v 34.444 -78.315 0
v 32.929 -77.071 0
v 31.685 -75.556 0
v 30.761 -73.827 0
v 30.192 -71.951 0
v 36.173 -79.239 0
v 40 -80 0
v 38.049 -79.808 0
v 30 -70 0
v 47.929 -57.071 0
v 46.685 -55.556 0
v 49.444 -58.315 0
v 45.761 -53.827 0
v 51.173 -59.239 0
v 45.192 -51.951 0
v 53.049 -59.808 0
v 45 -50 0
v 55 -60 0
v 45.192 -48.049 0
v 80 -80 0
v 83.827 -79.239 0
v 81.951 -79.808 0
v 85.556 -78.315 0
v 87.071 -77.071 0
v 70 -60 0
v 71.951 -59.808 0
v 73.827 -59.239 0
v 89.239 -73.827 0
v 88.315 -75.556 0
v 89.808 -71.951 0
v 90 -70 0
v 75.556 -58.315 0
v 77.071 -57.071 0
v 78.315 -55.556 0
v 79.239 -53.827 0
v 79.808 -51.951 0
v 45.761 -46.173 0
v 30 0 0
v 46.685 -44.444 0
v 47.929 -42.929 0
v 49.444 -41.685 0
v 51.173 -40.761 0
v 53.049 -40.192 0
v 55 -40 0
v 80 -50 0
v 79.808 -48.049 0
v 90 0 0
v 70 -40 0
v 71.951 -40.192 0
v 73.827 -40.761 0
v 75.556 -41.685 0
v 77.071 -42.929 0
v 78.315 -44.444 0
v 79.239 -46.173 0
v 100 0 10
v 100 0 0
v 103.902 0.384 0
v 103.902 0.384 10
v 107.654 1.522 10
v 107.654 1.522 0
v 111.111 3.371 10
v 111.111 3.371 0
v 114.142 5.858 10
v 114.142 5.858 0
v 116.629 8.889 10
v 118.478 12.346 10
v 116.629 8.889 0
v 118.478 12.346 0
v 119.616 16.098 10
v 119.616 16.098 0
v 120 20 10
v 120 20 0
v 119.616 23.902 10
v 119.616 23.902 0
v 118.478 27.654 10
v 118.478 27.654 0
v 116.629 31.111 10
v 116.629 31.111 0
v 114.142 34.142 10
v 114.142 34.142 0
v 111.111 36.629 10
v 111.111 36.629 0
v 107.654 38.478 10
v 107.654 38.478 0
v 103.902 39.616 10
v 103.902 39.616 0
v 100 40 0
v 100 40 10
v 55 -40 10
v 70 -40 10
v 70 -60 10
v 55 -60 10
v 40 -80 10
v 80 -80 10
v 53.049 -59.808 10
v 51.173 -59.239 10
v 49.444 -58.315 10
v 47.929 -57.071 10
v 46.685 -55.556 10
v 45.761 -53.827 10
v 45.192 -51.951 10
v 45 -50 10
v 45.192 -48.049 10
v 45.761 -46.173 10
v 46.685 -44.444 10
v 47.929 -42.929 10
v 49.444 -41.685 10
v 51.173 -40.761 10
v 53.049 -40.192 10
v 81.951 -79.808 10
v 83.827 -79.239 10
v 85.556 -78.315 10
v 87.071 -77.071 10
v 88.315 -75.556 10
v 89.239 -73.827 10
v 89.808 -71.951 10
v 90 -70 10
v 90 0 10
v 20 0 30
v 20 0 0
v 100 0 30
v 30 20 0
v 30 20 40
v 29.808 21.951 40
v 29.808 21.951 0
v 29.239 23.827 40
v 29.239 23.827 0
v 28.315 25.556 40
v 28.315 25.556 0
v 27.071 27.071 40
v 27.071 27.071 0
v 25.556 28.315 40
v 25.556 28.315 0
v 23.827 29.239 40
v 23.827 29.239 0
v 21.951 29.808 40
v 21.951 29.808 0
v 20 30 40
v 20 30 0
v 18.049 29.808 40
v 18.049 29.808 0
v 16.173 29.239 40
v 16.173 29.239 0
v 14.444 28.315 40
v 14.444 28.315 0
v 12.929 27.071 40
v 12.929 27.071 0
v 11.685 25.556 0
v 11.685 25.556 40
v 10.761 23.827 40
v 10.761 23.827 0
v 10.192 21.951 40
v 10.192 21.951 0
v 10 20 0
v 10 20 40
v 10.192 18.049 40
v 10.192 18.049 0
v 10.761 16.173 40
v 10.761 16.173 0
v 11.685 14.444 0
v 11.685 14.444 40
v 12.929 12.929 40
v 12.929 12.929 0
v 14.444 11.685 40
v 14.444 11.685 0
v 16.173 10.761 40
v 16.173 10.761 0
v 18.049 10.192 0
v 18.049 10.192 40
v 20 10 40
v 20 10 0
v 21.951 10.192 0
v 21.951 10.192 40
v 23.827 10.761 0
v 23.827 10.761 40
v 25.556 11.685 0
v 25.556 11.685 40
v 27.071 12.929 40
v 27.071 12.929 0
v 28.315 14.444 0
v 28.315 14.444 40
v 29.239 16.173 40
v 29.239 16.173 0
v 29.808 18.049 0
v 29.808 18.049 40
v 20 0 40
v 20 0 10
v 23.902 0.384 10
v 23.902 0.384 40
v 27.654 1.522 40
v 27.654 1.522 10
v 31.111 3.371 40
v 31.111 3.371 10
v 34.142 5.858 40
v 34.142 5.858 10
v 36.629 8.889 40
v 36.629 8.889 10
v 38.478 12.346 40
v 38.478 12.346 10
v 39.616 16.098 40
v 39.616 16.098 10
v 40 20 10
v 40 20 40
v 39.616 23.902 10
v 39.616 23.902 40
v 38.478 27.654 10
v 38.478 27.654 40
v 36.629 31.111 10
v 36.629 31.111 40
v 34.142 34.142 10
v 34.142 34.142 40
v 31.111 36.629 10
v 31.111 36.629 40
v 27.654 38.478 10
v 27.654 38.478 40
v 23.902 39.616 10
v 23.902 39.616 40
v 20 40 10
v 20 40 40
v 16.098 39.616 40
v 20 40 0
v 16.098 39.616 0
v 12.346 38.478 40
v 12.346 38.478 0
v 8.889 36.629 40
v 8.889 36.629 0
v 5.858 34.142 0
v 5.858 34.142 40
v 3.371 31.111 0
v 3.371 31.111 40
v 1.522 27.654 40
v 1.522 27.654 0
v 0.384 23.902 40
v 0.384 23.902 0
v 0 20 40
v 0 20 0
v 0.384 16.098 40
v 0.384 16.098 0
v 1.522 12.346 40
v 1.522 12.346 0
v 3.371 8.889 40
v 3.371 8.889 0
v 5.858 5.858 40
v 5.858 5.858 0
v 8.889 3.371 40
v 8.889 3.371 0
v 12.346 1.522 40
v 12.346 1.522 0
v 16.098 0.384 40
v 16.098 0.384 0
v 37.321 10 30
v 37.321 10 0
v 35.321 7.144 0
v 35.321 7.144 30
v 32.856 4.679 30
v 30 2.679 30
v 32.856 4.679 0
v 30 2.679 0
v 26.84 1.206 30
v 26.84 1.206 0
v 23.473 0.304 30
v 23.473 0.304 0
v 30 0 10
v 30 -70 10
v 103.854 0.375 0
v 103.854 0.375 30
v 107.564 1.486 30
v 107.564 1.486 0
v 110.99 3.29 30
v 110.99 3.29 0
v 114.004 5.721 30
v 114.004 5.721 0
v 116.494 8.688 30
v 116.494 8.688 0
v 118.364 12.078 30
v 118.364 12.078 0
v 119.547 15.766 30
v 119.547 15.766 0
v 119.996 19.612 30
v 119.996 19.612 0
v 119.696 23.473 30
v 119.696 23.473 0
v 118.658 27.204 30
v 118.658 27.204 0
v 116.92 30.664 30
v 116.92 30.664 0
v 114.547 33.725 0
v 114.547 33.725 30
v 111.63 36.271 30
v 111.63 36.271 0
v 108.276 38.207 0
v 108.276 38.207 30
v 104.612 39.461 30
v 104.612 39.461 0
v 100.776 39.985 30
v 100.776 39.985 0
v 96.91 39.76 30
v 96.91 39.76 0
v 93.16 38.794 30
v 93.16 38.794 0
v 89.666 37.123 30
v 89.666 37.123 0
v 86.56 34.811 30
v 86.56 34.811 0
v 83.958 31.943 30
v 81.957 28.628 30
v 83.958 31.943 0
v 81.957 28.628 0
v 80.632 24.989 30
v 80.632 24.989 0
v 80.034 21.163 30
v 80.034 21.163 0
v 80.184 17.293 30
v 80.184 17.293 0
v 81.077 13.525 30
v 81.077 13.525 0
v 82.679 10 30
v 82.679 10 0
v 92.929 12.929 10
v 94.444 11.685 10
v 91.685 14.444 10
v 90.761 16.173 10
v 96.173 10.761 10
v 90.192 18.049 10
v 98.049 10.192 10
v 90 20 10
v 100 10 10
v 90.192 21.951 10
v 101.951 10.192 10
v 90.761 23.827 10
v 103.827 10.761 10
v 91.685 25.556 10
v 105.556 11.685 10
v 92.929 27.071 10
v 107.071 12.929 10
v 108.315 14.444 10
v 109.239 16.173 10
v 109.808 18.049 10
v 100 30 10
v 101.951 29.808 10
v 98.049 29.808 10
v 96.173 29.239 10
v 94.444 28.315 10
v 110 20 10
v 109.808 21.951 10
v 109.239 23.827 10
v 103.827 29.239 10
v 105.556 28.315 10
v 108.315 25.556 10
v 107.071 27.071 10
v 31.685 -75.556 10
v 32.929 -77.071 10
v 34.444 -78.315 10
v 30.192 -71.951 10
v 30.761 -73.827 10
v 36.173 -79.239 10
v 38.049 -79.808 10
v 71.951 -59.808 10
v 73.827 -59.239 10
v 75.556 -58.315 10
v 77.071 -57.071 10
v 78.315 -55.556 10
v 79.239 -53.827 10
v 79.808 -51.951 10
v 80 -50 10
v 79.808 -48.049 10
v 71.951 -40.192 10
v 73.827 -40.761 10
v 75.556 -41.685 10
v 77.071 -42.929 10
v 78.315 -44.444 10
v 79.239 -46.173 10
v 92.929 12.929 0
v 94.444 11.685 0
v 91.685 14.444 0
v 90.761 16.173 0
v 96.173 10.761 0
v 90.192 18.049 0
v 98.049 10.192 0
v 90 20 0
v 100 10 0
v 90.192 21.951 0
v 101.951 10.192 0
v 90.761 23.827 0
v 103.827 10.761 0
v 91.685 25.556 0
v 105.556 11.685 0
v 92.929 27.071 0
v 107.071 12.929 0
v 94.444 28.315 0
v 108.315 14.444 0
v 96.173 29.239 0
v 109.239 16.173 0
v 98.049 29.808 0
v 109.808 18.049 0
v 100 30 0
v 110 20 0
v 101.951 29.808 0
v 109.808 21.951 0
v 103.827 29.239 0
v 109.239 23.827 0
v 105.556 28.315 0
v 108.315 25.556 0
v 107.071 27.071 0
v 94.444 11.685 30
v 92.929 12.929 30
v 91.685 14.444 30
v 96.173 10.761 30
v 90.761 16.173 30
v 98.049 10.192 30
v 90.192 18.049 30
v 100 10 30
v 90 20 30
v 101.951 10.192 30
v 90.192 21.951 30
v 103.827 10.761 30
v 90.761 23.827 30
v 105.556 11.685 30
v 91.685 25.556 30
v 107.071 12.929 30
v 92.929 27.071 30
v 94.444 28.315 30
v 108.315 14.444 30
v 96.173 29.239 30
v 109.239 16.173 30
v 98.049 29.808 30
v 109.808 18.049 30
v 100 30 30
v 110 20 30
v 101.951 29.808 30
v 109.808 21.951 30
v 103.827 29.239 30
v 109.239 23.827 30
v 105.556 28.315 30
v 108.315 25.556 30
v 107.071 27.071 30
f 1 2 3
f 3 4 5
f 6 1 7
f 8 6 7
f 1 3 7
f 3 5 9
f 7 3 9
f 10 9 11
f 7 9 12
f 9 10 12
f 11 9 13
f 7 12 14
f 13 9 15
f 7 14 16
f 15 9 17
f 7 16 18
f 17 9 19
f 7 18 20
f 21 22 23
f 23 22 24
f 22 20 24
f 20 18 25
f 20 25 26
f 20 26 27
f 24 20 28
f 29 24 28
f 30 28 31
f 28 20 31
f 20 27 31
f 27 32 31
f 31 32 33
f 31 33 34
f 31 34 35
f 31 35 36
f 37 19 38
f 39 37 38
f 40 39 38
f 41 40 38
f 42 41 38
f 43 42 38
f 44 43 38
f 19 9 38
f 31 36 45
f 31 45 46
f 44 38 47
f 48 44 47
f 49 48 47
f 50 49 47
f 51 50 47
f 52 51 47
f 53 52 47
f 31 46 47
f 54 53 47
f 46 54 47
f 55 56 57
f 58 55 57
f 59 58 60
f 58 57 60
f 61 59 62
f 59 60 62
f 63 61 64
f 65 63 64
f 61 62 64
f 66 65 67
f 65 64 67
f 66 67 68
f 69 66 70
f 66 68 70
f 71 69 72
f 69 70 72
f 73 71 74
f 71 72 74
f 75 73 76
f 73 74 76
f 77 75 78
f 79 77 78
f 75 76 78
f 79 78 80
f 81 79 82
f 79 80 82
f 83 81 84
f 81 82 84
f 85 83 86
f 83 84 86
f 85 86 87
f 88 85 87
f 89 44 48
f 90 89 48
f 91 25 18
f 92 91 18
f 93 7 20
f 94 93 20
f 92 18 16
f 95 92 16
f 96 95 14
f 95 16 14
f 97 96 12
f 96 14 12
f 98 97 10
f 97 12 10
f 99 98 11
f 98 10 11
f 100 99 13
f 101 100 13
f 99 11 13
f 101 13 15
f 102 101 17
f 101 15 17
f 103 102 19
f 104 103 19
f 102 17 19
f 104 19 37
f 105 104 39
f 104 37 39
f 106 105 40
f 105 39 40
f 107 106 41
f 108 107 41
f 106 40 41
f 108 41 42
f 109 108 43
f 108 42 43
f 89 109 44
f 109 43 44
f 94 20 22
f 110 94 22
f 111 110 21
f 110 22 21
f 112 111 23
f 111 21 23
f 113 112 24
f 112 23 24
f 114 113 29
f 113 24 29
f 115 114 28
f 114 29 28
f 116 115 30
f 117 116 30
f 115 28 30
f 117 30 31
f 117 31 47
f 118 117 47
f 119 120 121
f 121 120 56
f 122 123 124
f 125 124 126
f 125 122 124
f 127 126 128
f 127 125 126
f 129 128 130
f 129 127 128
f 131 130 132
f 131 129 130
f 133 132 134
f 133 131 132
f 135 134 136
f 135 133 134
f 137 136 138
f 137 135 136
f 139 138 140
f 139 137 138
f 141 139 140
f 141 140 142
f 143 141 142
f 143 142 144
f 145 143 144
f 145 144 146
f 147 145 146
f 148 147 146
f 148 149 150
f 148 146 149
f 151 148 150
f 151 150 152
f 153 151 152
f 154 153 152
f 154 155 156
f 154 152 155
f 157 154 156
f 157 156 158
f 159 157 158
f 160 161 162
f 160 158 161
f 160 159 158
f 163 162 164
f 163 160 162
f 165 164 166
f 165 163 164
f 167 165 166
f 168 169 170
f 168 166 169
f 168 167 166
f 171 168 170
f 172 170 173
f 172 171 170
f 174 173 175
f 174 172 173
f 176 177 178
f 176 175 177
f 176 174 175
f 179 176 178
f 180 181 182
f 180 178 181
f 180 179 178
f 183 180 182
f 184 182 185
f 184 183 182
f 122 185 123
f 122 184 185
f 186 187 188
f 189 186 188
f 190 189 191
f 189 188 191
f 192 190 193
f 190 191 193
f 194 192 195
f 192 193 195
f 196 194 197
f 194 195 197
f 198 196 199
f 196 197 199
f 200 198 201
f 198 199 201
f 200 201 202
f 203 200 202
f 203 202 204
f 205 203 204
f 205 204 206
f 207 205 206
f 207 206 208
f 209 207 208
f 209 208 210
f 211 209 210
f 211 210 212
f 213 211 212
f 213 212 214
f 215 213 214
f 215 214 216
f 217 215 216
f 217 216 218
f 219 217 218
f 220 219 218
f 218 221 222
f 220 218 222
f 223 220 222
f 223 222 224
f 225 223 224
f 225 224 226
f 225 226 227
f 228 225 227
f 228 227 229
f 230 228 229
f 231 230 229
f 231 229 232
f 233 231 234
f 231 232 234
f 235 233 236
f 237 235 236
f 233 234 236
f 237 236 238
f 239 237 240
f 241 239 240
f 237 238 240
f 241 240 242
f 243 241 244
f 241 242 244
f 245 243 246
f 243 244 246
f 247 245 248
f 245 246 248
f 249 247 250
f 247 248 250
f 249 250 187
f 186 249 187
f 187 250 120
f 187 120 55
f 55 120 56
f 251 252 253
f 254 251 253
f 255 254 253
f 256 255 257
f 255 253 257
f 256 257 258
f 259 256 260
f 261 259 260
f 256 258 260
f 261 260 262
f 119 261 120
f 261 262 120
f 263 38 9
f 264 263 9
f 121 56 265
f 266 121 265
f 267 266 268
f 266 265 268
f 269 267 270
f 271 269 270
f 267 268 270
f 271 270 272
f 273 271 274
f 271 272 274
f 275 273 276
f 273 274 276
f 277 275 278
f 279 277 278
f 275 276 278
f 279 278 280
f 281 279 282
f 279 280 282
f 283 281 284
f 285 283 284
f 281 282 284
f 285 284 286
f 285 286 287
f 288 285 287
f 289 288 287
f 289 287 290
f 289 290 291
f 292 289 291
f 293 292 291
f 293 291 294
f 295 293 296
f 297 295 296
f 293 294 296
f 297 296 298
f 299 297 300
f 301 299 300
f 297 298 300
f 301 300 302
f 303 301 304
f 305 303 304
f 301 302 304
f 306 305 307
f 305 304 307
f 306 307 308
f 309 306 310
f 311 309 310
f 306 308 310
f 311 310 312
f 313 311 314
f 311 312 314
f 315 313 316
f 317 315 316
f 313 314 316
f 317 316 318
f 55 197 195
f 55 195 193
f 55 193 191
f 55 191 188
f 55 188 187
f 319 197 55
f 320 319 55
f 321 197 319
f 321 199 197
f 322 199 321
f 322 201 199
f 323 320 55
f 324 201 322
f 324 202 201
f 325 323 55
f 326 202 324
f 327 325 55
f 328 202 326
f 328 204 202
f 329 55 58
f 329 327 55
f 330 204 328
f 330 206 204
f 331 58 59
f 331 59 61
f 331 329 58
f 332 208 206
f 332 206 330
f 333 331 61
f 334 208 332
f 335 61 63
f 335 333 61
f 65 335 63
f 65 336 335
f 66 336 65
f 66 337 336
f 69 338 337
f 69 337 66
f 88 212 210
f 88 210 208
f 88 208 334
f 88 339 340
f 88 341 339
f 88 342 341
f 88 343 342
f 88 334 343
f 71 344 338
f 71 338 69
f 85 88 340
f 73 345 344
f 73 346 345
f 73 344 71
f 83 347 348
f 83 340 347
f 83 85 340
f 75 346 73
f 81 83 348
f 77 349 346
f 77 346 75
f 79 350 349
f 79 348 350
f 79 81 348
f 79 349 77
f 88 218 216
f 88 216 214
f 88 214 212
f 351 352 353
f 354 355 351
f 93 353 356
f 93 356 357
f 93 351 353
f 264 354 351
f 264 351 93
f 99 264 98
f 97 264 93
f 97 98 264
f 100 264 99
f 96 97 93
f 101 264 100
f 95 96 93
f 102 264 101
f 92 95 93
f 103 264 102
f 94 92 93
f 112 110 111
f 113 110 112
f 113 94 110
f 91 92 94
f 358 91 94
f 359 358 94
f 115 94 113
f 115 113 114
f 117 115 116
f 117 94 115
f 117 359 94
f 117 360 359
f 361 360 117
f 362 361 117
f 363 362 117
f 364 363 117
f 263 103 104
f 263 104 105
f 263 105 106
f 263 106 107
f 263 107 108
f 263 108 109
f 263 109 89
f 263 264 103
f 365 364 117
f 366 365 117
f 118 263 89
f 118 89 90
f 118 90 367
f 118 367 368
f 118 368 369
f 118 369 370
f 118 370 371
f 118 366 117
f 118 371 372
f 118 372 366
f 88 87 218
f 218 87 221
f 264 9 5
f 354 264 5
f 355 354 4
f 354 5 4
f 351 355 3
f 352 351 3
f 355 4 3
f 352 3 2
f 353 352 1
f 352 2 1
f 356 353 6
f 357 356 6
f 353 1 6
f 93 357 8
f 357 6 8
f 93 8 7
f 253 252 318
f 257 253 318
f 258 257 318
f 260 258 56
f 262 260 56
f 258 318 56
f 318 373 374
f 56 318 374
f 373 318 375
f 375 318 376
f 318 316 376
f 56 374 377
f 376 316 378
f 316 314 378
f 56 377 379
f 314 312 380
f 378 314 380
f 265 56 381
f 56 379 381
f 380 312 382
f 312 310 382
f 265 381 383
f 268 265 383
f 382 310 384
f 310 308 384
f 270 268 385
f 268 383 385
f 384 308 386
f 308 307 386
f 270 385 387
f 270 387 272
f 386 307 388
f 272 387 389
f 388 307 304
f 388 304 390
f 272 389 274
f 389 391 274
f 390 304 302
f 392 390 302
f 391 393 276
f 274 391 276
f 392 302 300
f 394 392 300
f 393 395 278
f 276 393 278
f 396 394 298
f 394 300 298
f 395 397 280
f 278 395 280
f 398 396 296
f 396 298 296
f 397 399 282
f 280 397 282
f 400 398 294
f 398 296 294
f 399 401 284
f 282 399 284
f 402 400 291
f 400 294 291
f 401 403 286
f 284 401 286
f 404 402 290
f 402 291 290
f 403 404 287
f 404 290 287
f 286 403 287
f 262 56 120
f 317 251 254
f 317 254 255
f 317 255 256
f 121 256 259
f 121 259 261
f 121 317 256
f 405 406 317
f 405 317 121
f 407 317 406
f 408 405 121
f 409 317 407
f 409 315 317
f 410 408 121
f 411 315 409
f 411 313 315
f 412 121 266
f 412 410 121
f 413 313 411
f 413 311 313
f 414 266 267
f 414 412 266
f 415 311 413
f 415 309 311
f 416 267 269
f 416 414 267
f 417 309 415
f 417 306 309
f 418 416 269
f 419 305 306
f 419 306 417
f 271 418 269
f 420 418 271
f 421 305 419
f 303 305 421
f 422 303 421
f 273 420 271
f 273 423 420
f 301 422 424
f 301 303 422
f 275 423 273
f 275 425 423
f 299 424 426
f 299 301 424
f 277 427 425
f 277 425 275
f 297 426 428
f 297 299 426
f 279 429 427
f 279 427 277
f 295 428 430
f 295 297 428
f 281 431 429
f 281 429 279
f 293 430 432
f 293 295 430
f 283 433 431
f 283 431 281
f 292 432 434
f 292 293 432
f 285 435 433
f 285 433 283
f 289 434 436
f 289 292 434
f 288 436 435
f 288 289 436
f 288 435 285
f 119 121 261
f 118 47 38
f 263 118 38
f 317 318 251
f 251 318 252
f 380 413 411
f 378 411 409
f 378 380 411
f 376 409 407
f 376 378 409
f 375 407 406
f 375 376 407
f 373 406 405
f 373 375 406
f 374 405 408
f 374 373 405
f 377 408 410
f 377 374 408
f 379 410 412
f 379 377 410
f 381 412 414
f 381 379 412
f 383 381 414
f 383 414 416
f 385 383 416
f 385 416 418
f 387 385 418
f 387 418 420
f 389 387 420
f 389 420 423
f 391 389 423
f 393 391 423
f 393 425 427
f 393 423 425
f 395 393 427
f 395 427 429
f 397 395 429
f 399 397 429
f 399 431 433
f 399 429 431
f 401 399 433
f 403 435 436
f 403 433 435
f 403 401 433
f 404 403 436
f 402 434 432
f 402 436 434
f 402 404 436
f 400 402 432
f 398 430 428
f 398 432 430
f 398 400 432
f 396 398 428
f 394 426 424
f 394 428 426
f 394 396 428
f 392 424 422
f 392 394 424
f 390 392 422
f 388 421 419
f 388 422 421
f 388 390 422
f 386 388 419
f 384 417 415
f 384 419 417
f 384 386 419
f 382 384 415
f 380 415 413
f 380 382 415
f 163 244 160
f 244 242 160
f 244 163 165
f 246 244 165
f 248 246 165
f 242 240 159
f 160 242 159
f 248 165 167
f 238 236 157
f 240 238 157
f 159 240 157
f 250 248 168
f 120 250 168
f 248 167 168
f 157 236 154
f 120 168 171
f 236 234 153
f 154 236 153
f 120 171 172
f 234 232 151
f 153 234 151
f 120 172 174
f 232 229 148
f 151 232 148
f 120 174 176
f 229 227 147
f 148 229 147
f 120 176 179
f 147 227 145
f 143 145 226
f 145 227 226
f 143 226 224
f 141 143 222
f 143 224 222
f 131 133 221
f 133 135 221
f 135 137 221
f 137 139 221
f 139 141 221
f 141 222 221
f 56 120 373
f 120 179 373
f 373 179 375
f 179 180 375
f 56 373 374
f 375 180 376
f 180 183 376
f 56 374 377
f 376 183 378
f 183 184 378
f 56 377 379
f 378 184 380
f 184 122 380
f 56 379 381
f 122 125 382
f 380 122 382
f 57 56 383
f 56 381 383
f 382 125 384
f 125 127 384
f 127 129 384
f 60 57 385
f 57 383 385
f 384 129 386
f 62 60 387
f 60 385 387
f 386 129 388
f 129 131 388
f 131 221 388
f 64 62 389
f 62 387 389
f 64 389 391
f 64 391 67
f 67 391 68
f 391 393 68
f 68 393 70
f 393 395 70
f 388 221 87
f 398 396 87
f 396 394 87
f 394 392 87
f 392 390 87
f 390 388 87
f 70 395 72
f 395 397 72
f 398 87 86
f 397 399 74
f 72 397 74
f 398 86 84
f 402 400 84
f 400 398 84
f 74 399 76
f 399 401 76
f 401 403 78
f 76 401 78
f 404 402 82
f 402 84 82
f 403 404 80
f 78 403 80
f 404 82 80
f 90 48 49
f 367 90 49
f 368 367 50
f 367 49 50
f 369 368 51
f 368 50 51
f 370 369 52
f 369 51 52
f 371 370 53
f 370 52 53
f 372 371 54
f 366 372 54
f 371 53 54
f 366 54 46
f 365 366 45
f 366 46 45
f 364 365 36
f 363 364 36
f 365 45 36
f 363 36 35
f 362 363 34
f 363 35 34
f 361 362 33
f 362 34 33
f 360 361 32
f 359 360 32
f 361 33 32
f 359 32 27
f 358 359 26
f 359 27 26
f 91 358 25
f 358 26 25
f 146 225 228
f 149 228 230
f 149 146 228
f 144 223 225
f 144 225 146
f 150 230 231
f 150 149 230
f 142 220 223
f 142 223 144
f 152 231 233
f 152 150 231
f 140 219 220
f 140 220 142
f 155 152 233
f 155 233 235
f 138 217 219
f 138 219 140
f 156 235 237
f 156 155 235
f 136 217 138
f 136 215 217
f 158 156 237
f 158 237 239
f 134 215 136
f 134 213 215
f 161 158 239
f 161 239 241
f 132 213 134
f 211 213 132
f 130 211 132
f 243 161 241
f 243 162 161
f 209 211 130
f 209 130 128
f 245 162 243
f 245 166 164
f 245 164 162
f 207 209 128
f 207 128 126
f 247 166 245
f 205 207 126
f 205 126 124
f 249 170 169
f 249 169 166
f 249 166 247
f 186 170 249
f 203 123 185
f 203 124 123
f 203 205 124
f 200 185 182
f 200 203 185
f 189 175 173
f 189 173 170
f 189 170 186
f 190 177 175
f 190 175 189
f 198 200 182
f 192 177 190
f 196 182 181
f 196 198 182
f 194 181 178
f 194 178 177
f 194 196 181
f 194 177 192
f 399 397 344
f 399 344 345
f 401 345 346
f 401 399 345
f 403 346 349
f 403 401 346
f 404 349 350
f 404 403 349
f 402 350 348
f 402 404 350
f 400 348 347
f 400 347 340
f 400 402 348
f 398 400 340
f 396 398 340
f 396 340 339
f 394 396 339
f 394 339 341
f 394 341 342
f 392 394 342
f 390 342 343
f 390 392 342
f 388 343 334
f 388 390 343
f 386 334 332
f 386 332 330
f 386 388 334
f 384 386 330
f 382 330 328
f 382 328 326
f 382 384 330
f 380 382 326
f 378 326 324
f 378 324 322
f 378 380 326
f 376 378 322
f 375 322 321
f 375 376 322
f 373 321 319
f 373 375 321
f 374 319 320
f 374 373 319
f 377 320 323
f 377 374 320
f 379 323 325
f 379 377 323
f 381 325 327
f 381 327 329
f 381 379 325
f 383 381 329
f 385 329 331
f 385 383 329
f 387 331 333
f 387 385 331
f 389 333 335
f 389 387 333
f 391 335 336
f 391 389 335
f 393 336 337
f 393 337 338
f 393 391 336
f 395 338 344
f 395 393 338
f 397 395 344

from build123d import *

# Parameters (mm, degrees)
SKETCH1_R           = 10
BOSS_EXTRUDE1_DEPTH = 10
SKETCH1_4_R         = 20
BOSS_EXTRUDE2_DEPTH = 40
SKETCH1_5_R         = 10
CUT_EXTRUDE1_DEPTH  = 133.664991614
BOSS_EXTRUDE3_DEPTH = 30
SKETCH1_11_R        = 10
CUT_EXTRUDE2_DEPTH  = 133.664991614
BOSS_EXTRUDE4_DEPTH = 10


with BuildPart() as part:
    # Sketch1 → Boss-Extrude1 (new body)
    with BuildSketch(Plane.XY):
        with BuildLine():
            Line((100, 40), (20, 40))
            ThreePointArc((20, 40), (0, 20), (20, 0))
            Line((20, 0), (100, 0))
            ThreePointArc((100, 0), (120, 20), (100, 40))
        make_face()
        with Locations((100, 20)):
            Circle(SKETCH1_R, mode=Mode.SUBTRACT)
        with Locations((20, 20)):
            Circle(SKETCH1_R, mode=Mode.SUBTRACT)
    extrude(amount=BOSS_EXTRUDE1_DEPTH)

    # Sketch1<4> → Boss-Extrude2 (add)
    with BuildSketch(Plane.XY):
        with Locations((20, 20)):
            Circle(SKETCH1_4_R)
    extrude(amount=BOSS_EXTRUDE2_DEPTH)

    # Sketch1<5> → Cut-Extrude1 (cut, through all)
    with BuildSketch(Plane.XY):
        with Locations((20, 20)):
            Circle(SKETCH1_5_R)
    extrude(amount=CUT_EXTRUDE1_DEPTH, mode=Mode.SUBTRACT)


with BuildPart() as body_2:
    # Sketch1<10> → Boss-Extrude3 (new body)
    with BuildSketch(Plane.XY):
        with BuildLine():
            ThreePointArc((100, 0), (110, 37.320508076), (82.679491924, 10))
            Line((82.679491924, 10), (37.320508076, 10))
            ThreePointArc((37.320508076, 10), (30, 2.679491924), (20, 0))
            Line((20, 0), (100, 0))
        make_face()
    extrude(amount=BOSS_EXTRUDE3_DEPTH)

    # Sketch1<11> → Cut-Extrude2 (cut, through all)
    with BuildSketch(Plane.XY):
        with Locations((100, 20)):
            Circle(SKETCH1_11_R)
    extrude(amount=CUT_EXTRUDE2_DEPTH, mode=Mode.SUBTRACT)


with BuildPart() as body_3:
    # Sketch1<13> → Boss-Extrude4 (new body)
    with BuildSketch(Plane.XY):
        with BuildLine():
            Line((90, 0), (30, 0))
            Line((30, 0), (30, -70))
            ThreePointArc((30, -70), (32.928932188, -77.071067812), (40, -80))
            Line((40, -80), (80, -80))
            ThreePointArc((80, -80), (87.071067812, -77.071067812), (90, -70))
            Line((90, -70), (90, 0))
        make_face()
        with BuildLine():
            ThreePointArc((55, -60), (45, -50), (55, -40))
            Line((55, -40), (70, -40))
            ThreePointArc((70, -40), (80, -50), (70, -60))
            Line((70, -60), (55, -60))
        make_face(mode=Mode.SUBTRACT)
    extrude(amount=BOSS_EXTRUDE4_DEPTH)


solid = Compound([part.part, body_2.part, body_3.part])
